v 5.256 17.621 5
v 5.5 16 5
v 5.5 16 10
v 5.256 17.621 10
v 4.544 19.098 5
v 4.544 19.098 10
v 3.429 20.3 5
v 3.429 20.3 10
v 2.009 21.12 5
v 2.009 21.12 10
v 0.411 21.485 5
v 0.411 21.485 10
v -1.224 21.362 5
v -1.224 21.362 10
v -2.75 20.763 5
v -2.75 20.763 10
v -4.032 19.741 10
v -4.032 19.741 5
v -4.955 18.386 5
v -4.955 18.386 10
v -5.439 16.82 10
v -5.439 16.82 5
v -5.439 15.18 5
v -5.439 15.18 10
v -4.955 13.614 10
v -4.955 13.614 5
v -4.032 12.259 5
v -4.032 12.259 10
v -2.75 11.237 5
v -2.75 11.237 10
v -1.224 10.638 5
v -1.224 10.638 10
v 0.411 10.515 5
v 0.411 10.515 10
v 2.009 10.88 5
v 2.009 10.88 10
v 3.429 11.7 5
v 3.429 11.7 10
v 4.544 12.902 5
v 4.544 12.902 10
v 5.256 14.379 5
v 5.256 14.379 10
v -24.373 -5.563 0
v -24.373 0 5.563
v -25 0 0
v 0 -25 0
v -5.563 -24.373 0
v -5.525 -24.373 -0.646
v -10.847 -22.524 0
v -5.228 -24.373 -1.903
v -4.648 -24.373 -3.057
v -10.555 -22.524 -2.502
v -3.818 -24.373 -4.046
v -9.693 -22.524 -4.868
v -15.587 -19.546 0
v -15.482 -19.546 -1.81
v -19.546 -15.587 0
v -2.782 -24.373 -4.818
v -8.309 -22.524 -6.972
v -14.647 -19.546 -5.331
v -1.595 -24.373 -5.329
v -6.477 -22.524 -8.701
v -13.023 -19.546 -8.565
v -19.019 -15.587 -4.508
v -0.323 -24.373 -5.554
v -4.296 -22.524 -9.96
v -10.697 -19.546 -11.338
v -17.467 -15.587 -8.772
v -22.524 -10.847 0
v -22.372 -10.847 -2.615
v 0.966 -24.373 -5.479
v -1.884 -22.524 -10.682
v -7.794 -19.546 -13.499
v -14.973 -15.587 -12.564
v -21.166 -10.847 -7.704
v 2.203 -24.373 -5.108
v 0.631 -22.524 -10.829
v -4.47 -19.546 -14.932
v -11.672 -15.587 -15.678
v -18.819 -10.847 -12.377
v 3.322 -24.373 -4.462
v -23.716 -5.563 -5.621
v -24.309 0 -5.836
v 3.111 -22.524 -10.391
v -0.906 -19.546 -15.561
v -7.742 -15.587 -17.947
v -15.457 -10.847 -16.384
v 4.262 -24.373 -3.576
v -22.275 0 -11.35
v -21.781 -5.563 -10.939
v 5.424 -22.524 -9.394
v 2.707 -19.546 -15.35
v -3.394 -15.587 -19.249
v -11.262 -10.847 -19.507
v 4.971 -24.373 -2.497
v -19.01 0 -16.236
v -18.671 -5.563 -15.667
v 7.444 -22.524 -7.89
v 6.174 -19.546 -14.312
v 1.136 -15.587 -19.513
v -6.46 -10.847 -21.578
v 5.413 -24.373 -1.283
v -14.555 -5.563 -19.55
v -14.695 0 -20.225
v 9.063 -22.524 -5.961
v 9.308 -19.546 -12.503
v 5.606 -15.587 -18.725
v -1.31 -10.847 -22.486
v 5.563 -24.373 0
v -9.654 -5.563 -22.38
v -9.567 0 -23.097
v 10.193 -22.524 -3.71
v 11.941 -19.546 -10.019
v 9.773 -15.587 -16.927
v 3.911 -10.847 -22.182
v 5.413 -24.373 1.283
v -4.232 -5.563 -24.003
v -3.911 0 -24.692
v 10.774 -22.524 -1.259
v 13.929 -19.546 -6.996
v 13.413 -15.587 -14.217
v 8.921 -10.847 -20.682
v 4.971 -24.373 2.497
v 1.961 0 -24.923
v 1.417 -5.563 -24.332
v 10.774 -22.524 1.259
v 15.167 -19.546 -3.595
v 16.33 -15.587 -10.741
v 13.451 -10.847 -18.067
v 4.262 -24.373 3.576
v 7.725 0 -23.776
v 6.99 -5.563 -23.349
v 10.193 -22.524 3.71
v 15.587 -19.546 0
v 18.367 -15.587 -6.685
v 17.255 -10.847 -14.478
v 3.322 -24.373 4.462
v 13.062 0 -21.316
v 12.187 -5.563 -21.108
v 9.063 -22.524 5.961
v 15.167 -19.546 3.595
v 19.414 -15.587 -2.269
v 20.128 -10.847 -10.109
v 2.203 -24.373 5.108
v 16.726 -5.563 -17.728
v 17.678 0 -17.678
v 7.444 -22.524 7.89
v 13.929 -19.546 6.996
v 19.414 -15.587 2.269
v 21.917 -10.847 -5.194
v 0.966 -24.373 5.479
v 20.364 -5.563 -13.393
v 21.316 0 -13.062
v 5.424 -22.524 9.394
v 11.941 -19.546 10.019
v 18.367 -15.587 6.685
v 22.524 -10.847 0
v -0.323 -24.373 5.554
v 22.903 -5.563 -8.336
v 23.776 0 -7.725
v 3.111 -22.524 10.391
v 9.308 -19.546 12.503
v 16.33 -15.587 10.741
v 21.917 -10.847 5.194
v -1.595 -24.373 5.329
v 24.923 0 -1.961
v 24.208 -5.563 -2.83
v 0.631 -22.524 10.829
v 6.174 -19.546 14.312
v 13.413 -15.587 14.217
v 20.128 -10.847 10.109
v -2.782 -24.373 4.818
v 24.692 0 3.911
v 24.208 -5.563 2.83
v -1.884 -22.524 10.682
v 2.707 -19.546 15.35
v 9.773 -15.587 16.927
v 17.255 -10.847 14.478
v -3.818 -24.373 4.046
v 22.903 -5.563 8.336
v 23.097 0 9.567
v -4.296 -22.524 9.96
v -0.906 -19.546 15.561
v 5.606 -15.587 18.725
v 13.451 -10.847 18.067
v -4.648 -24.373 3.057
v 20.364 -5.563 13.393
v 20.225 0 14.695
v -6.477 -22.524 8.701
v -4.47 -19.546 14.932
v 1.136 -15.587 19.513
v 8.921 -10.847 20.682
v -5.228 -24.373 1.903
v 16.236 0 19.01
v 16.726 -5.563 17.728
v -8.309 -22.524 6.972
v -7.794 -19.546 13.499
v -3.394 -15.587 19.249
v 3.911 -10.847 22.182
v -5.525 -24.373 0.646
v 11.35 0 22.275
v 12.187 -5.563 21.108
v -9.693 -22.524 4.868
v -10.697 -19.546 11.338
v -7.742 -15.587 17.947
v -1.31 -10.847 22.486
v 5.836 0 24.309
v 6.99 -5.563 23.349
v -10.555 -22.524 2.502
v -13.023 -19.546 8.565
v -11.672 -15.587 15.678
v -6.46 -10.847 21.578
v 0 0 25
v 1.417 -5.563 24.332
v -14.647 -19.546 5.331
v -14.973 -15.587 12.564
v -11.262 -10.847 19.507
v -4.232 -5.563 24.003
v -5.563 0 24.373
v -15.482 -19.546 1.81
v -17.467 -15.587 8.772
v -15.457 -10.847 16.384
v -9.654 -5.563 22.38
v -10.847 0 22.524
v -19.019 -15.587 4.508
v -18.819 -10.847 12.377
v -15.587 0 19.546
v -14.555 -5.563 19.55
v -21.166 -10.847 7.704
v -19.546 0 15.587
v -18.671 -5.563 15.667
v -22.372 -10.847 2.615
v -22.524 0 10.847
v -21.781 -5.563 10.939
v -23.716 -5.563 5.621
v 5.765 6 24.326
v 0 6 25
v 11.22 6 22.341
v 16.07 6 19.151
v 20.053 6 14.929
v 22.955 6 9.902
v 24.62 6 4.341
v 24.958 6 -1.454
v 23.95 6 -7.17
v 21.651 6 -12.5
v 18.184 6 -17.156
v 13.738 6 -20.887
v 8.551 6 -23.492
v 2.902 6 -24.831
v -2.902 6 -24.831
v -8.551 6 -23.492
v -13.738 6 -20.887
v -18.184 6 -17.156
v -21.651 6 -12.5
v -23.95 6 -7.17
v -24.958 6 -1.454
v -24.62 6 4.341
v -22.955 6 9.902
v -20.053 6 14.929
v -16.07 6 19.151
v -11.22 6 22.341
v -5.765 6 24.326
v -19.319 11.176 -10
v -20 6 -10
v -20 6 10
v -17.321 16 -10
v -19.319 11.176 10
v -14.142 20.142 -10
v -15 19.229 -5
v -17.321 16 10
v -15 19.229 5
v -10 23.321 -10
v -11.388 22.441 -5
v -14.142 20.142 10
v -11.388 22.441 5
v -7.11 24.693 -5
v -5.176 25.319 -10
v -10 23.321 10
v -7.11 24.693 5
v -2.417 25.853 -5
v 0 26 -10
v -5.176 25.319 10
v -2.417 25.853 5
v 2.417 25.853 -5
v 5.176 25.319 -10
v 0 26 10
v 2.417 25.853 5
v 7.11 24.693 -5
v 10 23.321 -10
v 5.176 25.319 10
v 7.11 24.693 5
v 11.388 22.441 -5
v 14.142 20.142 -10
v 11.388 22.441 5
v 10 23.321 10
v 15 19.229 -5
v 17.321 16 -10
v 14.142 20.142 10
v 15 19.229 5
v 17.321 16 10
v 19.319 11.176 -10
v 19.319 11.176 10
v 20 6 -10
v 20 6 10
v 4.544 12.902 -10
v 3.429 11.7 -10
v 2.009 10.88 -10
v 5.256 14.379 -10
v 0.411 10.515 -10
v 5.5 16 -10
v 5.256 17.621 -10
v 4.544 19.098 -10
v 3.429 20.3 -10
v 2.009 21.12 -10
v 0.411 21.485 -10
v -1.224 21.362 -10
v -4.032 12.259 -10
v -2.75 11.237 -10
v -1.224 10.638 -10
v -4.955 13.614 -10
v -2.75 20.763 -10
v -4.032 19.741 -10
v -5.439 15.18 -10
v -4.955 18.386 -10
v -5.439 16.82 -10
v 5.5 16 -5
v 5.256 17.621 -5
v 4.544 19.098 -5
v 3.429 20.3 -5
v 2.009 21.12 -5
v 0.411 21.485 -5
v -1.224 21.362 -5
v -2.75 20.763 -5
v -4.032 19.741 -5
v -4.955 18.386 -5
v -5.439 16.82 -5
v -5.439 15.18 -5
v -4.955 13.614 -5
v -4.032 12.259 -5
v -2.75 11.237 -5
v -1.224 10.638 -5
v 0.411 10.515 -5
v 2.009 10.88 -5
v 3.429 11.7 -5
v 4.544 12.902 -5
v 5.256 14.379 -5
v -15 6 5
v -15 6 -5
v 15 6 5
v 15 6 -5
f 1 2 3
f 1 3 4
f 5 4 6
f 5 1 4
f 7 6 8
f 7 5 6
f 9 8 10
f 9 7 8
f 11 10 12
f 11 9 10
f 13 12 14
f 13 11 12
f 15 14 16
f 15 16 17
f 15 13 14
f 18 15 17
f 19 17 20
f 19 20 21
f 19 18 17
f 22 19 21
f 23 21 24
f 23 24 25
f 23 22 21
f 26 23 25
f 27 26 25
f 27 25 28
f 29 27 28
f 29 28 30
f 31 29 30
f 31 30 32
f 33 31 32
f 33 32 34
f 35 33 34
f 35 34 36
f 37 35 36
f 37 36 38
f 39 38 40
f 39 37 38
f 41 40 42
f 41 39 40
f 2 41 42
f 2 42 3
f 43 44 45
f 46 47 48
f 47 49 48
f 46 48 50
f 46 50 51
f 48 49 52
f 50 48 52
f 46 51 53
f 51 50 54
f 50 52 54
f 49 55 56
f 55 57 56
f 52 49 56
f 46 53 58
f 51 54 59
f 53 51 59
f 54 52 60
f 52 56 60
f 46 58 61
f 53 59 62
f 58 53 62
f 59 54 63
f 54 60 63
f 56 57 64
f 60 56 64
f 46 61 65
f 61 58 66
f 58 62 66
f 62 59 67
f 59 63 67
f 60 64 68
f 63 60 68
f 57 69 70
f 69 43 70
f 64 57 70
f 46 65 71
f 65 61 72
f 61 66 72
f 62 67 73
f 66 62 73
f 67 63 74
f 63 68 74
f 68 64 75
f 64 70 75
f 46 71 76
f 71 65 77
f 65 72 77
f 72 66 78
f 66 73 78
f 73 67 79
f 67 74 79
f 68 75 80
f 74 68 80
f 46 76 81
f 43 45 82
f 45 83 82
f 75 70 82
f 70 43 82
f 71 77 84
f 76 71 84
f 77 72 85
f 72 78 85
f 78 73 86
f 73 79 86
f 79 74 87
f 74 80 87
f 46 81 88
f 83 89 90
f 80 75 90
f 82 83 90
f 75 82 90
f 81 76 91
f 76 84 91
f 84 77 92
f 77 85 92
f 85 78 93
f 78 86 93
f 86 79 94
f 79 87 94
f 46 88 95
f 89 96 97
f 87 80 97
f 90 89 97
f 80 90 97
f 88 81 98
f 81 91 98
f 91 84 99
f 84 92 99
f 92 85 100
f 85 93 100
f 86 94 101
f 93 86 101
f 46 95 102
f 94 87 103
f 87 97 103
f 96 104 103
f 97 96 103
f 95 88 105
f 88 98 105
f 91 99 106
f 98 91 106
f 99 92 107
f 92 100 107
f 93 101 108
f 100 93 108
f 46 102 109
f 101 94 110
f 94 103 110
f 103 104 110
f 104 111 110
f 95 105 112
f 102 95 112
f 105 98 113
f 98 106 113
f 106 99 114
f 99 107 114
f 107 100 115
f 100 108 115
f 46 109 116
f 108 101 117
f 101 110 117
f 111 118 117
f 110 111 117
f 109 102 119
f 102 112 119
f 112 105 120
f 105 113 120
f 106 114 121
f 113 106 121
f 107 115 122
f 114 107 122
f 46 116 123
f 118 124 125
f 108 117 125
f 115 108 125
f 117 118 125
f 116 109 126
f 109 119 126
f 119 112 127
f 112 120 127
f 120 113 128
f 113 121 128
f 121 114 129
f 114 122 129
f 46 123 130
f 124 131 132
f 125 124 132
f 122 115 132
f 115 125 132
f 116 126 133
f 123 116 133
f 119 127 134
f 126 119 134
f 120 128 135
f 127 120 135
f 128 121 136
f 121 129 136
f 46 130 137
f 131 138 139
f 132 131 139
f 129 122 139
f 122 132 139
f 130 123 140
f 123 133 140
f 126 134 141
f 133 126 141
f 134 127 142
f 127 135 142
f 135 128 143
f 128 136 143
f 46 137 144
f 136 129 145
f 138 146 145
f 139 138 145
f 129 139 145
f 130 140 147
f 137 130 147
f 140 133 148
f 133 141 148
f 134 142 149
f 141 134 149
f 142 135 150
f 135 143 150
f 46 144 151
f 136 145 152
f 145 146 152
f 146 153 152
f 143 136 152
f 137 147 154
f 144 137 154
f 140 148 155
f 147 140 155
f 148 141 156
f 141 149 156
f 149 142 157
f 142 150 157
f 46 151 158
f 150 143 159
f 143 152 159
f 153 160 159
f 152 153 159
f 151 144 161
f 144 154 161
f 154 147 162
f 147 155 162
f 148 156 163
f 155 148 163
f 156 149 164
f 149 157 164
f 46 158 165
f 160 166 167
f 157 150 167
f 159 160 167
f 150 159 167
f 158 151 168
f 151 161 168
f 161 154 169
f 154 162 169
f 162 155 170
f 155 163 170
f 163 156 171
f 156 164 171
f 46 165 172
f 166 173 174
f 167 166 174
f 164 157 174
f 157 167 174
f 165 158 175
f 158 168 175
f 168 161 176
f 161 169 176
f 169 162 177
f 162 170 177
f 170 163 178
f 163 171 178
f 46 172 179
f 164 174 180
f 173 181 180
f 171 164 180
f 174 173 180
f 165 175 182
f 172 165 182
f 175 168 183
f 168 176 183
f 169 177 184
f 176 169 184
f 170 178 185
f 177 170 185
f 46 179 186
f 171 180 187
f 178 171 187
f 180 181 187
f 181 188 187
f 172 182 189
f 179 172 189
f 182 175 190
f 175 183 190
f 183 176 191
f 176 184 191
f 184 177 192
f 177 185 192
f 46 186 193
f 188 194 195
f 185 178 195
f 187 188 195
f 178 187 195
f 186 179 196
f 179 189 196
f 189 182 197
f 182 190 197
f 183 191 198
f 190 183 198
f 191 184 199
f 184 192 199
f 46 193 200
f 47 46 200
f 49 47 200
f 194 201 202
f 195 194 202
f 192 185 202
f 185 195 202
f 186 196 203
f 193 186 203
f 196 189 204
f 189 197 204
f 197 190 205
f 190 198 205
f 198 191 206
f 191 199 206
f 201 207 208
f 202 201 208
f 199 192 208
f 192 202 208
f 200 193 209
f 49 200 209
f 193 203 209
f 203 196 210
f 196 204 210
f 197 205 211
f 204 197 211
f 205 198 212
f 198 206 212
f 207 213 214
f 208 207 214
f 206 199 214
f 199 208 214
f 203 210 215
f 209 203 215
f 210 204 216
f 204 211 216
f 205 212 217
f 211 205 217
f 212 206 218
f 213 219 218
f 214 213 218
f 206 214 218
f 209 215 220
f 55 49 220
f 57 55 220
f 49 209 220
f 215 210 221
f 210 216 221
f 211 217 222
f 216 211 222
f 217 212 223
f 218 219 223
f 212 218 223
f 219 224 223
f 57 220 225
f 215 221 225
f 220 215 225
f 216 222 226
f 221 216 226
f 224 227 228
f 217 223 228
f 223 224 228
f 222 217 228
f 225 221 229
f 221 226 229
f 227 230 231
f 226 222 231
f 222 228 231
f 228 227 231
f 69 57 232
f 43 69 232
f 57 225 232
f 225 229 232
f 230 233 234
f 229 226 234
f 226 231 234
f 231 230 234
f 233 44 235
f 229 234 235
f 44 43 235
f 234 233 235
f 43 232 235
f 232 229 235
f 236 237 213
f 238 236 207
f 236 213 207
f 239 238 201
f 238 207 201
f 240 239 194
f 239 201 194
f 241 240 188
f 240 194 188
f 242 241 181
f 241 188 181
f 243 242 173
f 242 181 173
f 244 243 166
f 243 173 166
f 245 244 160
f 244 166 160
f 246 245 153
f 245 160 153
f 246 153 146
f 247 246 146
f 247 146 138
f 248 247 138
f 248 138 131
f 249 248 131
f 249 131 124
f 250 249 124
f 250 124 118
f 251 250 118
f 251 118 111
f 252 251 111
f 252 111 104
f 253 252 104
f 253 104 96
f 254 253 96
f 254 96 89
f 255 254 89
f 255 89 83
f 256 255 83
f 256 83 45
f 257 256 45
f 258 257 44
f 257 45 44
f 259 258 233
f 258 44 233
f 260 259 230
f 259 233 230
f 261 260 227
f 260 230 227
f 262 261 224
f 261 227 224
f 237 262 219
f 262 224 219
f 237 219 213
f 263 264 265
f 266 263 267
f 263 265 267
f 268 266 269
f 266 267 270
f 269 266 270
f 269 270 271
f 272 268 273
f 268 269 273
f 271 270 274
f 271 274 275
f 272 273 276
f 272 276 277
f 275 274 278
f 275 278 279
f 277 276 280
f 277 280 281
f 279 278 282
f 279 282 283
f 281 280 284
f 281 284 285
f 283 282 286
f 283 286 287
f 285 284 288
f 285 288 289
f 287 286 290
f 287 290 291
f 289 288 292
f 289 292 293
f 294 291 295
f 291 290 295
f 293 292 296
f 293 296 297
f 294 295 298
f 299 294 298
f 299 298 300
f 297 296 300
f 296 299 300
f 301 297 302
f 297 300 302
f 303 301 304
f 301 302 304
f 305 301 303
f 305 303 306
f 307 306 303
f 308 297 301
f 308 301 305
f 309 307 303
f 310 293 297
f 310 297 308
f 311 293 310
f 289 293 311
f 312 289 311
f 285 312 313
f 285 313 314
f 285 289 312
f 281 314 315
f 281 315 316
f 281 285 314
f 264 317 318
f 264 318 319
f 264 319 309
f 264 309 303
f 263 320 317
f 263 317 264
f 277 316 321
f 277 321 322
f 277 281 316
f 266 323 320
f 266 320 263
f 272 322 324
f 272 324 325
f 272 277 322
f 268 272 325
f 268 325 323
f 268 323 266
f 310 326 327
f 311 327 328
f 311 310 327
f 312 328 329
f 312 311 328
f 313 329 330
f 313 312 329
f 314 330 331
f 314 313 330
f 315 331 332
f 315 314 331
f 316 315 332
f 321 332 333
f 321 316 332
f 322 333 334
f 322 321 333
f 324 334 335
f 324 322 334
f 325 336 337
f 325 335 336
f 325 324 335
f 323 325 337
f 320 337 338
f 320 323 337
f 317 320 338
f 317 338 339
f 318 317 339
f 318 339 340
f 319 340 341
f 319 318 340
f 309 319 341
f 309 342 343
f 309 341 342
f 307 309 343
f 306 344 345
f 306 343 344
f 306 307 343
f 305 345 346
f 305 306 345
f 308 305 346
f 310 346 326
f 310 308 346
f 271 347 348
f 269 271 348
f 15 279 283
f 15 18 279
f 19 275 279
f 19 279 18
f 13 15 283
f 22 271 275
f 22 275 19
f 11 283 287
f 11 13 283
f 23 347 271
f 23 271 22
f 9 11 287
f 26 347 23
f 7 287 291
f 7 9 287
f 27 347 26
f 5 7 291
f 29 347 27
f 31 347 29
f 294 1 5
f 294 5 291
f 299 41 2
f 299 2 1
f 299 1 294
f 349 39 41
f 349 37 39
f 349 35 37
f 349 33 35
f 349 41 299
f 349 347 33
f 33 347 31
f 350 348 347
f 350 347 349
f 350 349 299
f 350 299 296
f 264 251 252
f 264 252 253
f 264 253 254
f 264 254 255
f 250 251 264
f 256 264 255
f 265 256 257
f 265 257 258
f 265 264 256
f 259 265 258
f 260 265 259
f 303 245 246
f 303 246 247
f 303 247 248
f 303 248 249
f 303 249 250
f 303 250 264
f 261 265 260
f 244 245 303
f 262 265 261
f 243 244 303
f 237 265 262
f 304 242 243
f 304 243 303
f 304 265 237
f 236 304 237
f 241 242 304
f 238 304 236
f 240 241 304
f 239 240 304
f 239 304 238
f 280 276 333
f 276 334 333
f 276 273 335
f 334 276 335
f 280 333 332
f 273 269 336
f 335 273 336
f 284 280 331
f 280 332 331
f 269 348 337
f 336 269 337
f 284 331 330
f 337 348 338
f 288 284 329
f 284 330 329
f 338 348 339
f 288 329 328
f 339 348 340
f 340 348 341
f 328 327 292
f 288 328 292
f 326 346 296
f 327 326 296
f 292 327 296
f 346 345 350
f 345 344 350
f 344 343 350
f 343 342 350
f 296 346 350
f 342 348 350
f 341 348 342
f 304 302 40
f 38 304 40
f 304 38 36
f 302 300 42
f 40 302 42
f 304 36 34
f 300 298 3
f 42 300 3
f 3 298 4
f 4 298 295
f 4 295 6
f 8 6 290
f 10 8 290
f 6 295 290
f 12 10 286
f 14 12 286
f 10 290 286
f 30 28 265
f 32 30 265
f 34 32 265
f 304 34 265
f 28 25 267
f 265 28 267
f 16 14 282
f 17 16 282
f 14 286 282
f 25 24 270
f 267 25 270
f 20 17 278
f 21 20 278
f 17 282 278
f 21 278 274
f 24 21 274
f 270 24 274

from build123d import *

# Parameters (mm, degrees)
SKETCH8_R            = 25
BOSS_EXTRUDE7_DEPTH  = 6
SKETCH11_R           = 5.5
BOSS_EXTRUDE12_DEPTH = 10
SKETCH14_W           = 30
SKETCH14_H           = 10
CUT_EXTRUDE2_DEPTH   = 41.620192023


with BuildPart() as part:
    # Sketch8 → Boss-Extrude7 (new body)
    with BuildSketch(Plane(origin=(0, 0, 0), x_dir=(1, 0, 0), z_dir=(0, 1, 0))):
        with Locations(Location((0, 0, 0), (0, 0, 270))):
            Circle(SKETCH8_R)
    extrude(amount=BOSS_EXTRUDE7_DEPTH)

    # Sketch11 → Boss-Extrude12 (add, symmetric)
    with BuildSketch(Plane.XY):
        with BuildLine():
            Line((20, 6), (-20, 6))
            ThreePointArc((-20, 6), (0, 26), (20, 6))
        make_face()
        with Locations((0, 16)):
            Circle(SKETCH11_R, mode=Mode.SUBTRACT)
    extrude(amount=BOSS_EXTRUDE12_DEPTH, both=True)

    # Sketch14 → Cut-Extrude2 (cut, through all)
    with BuildSketch(Plane(origin=(0, 6, 0), x_dir=(1, 0, 0), z_dir=(0, 1, 0))):
        Rectangle(SKETCH14_W, SKETCH14_H)
    extrude(amount=CUT_EXTRUDE2_DEPTH, mode=Mode.SUBTRACT)

    # Sketch15 → Revolve1 (revolve)
    with BuildSketch(Plane.XY, mode=Mode.PRIVATE) as revolve1_sk:
        with BuildLine():
            Line((0, 0), (0, -25))
            ThreePointArc((0, -25), (17.67766953, -17.67766953), (25, 0))
            Line((25, 0), (0, 0))
        make_face()
    revolve(revolve1_sk.sketch.rotate(Axis((0, 0, 0), (0, -1, 0)), 180), axis=Axis((0, 0, 0), (0, -1, 0)))


solid = part.part
